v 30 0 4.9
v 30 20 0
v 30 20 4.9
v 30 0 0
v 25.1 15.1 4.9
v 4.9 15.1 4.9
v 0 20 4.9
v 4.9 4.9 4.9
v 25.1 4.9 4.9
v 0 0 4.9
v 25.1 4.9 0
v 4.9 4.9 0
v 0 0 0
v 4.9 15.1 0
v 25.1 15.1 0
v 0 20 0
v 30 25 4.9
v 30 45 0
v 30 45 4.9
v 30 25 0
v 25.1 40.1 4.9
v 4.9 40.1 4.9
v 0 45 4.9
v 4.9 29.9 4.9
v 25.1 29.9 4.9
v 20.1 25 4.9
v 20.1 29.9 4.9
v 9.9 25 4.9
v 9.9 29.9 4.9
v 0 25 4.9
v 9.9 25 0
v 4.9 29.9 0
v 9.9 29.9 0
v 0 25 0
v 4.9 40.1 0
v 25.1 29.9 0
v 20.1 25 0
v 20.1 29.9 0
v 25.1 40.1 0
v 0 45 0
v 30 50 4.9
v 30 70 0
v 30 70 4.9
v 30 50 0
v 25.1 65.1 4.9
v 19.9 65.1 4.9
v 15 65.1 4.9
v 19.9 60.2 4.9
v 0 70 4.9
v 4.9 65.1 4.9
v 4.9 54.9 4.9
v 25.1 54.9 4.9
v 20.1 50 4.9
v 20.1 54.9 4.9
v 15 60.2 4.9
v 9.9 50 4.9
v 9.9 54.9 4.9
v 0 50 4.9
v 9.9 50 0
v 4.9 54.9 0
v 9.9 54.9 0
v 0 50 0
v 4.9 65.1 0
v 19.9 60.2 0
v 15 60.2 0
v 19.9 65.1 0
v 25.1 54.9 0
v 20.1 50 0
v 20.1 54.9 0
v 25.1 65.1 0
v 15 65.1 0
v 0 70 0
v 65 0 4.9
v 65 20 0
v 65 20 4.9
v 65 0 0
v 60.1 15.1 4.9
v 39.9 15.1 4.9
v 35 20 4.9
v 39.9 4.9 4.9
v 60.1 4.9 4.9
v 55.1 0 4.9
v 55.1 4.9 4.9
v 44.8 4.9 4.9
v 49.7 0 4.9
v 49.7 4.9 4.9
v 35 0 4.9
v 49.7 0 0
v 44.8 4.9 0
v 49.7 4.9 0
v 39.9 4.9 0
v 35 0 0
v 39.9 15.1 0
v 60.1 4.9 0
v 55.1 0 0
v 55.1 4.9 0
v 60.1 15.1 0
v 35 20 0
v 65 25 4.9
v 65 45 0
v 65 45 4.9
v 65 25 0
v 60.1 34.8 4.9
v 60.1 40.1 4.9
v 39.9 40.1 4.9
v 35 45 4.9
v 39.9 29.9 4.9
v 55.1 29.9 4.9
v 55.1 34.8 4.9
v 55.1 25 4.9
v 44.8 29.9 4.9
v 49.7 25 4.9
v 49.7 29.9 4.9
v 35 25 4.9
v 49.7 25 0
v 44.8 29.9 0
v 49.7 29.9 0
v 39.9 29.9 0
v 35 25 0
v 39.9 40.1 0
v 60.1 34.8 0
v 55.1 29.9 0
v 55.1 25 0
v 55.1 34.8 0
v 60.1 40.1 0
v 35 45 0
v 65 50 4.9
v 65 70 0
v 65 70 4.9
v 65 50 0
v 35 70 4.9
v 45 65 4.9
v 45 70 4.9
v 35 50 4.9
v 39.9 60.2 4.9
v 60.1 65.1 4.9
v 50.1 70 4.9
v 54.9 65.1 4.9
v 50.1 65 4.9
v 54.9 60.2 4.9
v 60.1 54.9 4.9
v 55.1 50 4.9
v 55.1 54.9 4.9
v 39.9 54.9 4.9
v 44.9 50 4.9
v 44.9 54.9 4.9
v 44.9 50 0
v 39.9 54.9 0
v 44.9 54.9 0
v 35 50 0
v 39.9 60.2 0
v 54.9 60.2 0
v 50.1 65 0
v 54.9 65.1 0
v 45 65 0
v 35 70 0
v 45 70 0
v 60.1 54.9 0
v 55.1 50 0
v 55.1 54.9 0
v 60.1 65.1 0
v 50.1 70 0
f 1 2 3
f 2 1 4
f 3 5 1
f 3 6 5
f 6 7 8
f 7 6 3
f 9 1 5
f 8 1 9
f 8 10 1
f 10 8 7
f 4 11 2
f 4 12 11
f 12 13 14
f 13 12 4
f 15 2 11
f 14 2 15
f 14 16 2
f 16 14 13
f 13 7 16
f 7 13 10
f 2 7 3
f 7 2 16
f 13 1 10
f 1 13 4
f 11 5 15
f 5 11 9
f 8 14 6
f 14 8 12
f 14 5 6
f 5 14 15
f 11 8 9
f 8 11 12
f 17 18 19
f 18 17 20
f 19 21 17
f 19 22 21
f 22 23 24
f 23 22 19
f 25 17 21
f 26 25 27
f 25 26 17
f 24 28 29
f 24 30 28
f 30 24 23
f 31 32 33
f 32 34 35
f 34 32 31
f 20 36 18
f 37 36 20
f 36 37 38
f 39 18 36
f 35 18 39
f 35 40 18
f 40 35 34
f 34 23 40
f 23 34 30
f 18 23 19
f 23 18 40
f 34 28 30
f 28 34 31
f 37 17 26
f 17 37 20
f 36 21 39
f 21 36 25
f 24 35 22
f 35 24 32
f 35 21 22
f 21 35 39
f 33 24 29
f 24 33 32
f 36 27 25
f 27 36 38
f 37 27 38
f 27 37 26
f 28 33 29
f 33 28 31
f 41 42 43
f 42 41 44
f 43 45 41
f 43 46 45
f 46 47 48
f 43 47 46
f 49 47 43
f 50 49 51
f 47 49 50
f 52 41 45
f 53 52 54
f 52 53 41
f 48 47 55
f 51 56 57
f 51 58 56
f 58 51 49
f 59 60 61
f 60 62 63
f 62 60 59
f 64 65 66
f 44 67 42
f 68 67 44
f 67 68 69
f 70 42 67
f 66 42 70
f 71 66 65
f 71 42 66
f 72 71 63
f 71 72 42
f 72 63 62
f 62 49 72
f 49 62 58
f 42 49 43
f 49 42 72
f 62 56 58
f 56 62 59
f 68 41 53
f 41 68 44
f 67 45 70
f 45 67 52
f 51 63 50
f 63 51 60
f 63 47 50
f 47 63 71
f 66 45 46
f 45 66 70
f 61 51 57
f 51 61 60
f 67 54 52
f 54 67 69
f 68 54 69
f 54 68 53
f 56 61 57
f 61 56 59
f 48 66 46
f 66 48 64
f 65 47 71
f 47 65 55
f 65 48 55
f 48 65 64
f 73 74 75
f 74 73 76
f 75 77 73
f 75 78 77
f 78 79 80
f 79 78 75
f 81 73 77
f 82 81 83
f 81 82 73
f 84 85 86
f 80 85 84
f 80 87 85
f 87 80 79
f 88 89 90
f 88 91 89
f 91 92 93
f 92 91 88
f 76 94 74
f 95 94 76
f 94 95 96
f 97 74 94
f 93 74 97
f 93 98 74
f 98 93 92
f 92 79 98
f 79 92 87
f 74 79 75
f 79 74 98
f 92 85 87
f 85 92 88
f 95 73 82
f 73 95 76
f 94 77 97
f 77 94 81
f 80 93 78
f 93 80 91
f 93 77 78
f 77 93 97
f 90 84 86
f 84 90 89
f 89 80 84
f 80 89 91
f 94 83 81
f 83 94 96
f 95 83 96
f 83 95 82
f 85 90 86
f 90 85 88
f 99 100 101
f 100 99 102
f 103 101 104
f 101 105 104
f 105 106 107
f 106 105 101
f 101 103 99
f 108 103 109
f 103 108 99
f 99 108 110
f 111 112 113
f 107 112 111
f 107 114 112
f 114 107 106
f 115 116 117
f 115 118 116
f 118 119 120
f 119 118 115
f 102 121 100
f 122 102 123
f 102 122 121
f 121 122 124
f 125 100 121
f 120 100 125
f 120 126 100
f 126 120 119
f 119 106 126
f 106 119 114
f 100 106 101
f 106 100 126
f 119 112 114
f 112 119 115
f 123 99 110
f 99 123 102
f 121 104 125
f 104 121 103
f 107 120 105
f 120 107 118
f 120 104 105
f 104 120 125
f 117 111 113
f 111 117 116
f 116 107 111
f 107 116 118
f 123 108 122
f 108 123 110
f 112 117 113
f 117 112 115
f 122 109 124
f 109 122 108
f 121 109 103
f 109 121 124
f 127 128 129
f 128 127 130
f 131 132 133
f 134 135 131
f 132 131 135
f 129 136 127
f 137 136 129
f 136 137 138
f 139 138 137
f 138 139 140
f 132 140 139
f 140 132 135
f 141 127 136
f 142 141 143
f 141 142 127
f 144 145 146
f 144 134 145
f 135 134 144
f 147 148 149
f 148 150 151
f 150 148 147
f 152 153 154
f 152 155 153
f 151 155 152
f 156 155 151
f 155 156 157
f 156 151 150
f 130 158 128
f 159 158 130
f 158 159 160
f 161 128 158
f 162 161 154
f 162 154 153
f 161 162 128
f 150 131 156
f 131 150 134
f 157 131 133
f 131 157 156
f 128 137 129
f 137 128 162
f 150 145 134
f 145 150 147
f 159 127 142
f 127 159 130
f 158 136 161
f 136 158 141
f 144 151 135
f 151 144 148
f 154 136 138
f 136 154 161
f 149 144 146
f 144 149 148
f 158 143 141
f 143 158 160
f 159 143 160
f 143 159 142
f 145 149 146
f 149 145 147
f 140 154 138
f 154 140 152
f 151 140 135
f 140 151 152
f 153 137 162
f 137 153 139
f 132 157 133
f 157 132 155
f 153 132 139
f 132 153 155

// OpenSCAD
thick = 5; // size factor, mm
margin = 0.1;
part1();
translate([0,5*thick,0]) part2();
translate([0,10*thick,0]) part3();
translate([7*thick,0, 0]) part4();
translate([7*thick,5*thick, 0]) part5();
translate([7*thick,10*thick,0]) part6();

module baseCube(b,m) { cube([6*b, 4*b, b-m]); }

// Part 1
module part1() {
    difference() {
        baseCube(thick, margin);
        translate([thick-margin, thick-margin, 0]) 
            cube([4*thick+2*margin, 2*thick+2*margin, thick-margin]);
    }
}

// Part 2
module part2() {
    difference() {
        part1();
        translate([2*thick-margin, 0, 0]) cube([2*thick+2*margin, thick+2*margin, thick]);
    }
}

// Part 3
module part3() {
    union() {
        part2();
        translate([3*thick, 2*thick+2*margin, 0]) cube(thick-margin);
    }
}

// Part 4
module part4() {
    union() {
        part2();
        translate([2*thick-2*margin, 0, 0]) cube(thick-margin);
    }
}

// Part 5
module part5() {
    union() {
        part4();
        translate([4*thick+margin, thick-margin, 0]) cube([thick, thick-margin, , thick-margin]);
    }
}

// Part 6
module part6() {
    difference() {
        union() {part2(); translate([0, 2*thick+2*margin, 0]) cube([4*thick-margin, thick-margin, thick-margin]); }
        translate([2*thick, 3*thick, 0]) #cube([thick+margin, thick+margin, , thick]);
    }
}
